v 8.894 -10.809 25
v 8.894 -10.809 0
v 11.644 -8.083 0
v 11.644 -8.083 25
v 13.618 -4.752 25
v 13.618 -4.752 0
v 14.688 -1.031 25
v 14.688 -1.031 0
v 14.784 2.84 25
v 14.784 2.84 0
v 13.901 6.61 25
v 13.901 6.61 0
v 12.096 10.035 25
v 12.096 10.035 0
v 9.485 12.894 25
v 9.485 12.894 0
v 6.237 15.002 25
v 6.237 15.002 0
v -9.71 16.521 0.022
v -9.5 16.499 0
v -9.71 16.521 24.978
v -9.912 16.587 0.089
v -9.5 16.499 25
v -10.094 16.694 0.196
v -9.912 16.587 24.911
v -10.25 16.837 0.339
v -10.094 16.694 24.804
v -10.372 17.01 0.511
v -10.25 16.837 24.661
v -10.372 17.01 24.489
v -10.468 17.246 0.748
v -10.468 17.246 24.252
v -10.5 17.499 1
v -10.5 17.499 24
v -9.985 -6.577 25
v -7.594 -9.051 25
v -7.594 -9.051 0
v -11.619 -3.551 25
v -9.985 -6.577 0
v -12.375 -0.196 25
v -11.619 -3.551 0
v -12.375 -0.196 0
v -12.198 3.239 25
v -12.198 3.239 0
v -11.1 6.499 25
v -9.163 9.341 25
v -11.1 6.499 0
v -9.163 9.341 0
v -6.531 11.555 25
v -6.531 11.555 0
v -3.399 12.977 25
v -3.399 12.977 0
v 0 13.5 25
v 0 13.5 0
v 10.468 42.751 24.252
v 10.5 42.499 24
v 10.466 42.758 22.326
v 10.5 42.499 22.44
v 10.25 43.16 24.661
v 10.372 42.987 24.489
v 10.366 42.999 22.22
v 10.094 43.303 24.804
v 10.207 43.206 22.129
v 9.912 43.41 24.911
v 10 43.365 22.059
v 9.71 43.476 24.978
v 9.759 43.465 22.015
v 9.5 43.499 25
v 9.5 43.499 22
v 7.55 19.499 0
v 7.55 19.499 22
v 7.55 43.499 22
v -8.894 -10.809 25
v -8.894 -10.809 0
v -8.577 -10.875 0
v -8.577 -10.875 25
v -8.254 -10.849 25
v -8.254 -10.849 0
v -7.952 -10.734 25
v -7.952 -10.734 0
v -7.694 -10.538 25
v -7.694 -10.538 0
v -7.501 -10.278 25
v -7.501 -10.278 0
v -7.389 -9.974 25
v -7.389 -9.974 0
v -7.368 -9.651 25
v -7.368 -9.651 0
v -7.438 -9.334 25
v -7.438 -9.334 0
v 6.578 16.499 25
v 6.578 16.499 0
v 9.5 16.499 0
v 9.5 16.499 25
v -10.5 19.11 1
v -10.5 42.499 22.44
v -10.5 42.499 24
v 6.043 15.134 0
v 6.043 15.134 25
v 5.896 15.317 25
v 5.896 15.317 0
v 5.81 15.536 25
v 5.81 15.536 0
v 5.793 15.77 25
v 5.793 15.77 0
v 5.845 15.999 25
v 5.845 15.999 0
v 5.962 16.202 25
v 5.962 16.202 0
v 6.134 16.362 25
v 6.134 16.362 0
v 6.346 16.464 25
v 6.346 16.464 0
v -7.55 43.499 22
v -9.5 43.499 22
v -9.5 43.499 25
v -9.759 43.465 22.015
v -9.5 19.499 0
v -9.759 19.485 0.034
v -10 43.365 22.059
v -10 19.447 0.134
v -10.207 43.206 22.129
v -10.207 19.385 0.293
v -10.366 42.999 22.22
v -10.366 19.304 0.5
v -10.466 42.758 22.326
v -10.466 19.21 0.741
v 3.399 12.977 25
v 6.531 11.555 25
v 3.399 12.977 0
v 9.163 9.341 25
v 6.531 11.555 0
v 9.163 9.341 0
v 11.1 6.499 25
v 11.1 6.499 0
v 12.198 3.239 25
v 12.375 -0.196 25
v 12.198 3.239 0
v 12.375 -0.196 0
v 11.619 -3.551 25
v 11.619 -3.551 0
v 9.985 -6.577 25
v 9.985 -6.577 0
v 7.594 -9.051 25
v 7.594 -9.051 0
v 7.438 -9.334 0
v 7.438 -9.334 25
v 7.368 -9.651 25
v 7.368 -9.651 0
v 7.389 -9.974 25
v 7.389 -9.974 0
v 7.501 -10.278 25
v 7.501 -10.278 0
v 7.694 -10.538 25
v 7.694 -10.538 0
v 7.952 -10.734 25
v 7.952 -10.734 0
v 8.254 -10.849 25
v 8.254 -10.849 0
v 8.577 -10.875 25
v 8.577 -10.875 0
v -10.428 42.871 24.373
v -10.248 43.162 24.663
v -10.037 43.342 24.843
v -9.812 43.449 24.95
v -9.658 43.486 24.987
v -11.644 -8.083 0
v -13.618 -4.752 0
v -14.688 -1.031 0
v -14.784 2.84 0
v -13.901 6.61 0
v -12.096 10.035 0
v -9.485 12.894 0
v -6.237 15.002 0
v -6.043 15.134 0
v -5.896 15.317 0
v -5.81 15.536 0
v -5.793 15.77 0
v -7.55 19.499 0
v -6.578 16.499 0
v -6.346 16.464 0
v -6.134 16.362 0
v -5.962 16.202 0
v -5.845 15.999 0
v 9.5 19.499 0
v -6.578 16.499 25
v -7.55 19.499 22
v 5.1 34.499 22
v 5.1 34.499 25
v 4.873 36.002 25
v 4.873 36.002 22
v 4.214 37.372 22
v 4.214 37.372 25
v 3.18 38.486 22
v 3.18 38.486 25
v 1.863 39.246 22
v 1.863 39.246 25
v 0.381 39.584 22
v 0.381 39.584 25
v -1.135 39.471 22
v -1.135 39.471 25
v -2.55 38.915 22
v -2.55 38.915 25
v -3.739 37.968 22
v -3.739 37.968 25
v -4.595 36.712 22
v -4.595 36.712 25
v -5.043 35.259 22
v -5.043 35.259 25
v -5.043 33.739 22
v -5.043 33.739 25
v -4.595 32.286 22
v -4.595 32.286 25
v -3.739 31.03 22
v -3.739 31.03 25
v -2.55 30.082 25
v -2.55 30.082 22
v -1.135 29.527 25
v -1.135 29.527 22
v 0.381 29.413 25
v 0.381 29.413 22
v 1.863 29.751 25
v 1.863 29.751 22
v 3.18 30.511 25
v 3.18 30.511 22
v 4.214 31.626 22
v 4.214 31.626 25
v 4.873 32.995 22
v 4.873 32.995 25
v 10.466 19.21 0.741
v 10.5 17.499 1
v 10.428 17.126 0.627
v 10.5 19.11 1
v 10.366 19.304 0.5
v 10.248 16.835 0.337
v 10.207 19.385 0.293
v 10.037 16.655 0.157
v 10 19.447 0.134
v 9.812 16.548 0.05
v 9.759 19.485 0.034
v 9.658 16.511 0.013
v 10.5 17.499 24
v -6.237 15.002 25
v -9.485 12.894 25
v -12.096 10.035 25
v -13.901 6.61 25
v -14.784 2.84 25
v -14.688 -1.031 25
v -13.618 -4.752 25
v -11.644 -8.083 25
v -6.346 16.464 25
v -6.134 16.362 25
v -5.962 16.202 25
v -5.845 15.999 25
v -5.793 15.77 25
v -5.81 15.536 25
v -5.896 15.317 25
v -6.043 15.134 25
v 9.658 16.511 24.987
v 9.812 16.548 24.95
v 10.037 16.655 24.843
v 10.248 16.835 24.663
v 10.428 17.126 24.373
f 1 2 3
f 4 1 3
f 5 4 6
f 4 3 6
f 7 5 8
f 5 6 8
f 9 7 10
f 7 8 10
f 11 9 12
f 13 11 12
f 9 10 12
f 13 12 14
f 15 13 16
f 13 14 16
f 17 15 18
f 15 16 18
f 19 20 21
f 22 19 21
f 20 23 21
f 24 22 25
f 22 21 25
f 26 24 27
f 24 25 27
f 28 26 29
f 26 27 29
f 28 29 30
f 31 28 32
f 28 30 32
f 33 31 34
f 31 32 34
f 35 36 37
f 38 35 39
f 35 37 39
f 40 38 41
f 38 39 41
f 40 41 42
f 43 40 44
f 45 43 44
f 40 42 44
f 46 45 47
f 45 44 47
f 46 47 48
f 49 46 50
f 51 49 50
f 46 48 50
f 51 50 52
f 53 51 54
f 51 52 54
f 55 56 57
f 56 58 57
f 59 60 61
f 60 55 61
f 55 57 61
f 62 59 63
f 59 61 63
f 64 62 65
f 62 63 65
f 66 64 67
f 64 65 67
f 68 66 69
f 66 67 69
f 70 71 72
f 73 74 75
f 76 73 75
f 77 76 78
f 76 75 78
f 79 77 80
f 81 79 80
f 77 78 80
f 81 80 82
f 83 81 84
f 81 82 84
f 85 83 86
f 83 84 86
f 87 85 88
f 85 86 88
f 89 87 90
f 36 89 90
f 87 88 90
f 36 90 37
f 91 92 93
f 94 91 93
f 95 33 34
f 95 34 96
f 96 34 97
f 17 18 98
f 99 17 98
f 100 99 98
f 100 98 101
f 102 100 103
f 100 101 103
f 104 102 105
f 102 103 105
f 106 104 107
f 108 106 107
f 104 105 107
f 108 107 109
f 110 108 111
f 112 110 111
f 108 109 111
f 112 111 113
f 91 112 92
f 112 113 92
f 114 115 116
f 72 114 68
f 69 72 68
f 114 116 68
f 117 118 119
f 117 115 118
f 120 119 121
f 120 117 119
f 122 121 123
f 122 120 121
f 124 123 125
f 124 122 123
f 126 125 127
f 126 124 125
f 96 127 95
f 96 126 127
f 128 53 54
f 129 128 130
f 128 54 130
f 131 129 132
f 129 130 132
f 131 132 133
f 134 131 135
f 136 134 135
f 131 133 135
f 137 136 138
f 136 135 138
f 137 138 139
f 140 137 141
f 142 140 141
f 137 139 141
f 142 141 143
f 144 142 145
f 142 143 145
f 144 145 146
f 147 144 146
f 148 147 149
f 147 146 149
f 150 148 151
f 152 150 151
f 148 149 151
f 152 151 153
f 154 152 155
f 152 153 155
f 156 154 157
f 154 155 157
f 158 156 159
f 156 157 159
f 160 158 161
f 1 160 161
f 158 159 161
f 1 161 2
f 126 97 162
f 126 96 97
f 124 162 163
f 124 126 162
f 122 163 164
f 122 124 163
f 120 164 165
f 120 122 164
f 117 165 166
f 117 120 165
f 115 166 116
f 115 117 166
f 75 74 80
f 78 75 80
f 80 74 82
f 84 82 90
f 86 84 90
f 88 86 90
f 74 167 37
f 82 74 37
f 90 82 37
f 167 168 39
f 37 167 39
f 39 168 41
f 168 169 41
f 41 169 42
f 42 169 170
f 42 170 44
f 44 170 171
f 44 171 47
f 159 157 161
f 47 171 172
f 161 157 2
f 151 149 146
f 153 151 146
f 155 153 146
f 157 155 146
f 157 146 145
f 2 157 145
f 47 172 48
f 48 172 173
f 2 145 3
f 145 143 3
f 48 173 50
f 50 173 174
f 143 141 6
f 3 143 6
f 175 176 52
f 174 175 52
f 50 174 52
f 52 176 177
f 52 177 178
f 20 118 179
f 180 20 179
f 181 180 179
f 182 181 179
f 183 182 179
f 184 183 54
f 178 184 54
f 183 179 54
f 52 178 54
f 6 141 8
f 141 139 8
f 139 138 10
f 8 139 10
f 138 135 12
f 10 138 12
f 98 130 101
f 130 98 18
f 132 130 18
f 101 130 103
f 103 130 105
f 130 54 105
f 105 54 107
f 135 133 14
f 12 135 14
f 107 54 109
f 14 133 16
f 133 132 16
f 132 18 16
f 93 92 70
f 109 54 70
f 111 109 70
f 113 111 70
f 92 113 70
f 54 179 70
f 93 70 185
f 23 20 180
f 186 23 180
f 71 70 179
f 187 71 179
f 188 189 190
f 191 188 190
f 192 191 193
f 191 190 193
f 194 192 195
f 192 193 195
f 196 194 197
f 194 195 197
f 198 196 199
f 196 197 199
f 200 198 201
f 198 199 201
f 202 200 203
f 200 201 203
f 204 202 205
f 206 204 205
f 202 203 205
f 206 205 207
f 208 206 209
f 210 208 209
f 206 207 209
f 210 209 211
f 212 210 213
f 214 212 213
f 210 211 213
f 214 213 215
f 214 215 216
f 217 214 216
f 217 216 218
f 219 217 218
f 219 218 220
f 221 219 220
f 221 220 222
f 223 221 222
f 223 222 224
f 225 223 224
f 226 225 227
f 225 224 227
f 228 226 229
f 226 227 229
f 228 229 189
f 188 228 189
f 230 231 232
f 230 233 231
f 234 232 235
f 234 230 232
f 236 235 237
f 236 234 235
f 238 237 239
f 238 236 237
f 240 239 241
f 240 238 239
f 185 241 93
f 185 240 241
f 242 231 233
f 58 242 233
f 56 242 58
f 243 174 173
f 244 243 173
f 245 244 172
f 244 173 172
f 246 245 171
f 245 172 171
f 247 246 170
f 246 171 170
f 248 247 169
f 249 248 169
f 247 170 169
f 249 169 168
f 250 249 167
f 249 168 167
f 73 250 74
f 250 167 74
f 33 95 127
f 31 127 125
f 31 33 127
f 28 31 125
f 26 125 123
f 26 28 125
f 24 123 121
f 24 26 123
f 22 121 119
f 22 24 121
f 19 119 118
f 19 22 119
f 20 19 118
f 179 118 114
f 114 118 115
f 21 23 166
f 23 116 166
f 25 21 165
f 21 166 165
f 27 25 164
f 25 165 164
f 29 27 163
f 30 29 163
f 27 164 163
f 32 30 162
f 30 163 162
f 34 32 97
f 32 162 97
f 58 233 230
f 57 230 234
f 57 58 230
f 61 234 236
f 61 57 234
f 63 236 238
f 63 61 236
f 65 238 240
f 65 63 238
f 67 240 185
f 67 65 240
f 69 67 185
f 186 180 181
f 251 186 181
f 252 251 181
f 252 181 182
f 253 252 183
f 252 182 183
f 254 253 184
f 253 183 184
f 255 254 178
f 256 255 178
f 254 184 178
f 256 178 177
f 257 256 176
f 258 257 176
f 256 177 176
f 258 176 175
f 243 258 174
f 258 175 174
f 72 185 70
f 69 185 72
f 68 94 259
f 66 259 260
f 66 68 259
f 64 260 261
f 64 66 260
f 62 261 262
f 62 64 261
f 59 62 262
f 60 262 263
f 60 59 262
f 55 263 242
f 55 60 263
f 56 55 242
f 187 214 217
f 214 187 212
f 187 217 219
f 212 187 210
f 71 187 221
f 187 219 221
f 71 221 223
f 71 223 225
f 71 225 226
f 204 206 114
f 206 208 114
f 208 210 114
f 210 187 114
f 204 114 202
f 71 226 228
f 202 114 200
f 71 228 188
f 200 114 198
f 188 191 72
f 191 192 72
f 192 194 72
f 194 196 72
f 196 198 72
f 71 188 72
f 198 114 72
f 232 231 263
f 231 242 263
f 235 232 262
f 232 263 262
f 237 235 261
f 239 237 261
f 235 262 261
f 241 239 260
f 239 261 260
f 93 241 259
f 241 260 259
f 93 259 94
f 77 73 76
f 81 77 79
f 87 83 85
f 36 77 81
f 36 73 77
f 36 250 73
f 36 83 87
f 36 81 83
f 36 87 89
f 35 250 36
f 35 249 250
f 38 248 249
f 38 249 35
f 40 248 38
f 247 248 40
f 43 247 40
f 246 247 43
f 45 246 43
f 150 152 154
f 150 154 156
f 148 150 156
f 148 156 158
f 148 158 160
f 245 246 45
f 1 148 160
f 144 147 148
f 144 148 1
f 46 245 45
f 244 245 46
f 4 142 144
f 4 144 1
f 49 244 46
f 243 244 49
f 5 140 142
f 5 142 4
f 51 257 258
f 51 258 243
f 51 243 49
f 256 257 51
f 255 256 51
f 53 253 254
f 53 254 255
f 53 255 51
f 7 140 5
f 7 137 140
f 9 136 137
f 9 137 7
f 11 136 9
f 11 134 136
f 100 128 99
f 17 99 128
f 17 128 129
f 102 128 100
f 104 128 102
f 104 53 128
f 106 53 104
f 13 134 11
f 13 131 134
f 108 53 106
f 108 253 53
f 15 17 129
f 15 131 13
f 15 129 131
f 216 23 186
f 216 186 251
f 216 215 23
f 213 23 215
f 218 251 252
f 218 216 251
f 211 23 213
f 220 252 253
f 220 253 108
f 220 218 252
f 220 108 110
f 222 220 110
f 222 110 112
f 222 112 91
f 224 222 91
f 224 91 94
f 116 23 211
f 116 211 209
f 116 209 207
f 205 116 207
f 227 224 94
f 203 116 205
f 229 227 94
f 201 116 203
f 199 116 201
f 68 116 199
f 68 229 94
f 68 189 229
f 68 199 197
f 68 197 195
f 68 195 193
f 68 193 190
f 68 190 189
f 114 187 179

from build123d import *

# Parameters (mm, degrees)
F1_DEPTH = 25
F2_W     = 21
F2_H     = 24
F2_R     = 5.1
F3_DEPTH = 3
F6_DEPTH = 2.95
F8_R     = 1


with BuildPart() as f1:
    # F0 (on Top) → F1 (new body)
    with BuildSketch(Plane.XY):
        with BuildLine():
            ThreePointArc((7.5943561158, -9.0506011845), (7.5880140669, -10.4148995325), (8.8942921325, -10.8085844568))
            ThreePointArc((8.8942921325, -10.8085844568), (14.7842599605, 2.839809495), (6.2367777531, 15.0016731019))
            ThreePointArc((6.2367777531, 15.0016731019), (5.8102691618, 15.8862752393), (6.5779752006, 16.4986949957))
            Line((6.5779752006, 16.4986949957), (10.5, 16.4986949957))
            Line((10.5, 16.4986949957), (10.5, 19.4986949957))
            Line((10.5, 19.4986949957), (-10.5, 19.4986949957))
            Line((-10.5, 19.4986949957), (-10.5, 16.4986949957))
            Line((-10.5, 16.4986949957), (-6.5779752006, 16.4986949957))
            ThreePointArc((-6.5779752006, 16.4986949957), (-5.8102691618, 15.8862752393), (-6.2367777531, 15.0016731019))
            ThreePointArc((-6.2367777531, 15.0016731019), (-14.7842599605, 2.839809495), (-8.8942921325, -10.8085844568))
            ThreePointArc((-8.8942921325, -10.8085844568), (-7.5880140669, -10.4148995325), (-7.5943561158, -9.0506011845))
            ThreePointArc((-7.5943561158, -9.0506011845), (-11.760600173, 4.9065375968), (0, 13.5))
            ThreePointArc((0, 13.5), (11.760600173, 4.9065375968), (7.5943561158, -9.0506011845))
        make_face()
    extrude(amount=F1_DEPTH)

    # F2 (on face) → F3 (join)
    with BuildSketch(Plane.XY.offset(25)):
        with Locations((0, 31.4986949957)):
            Rectangle(F2_W, F2_H)
        with Locations((0, 34.4986949957)):
            Circle(F2_R, mode=Mode.SUBTRACT)
    extrude(amount=-F3_DEPTH)

    # F4: union 

    # F5 (on face) → F6 (join)
    with BuildSketch(Plane.YZ.offset(10.5)):
        Polygon((19.4986949957, 22), (19.4986949957, 0), (43.4986949957, 22), align=None)
    extrude(amount=-F6_DEPTH)

    # F7: F1 across plane


with BuildPart() as f1_1:
    add(f1.part)
    add(f1.part.mirror(Plane.YZ))

    # F8
    f8_edges = [f1_1.edges().sort_by_distance(p)[0] for p in [
        (10.5, 17.998695, 0),
        (10.5, 16.498695, 12.5),
        (10.5, 29.998695, 25),
        (10.5, 43.498695, 23.5),
        (10.5, 31.498695, 11),
        (-10.5, 43.498695, 23.5),
        (-10.5, 29.998695, 25),
        (-10.5, 16.498695, 12.5),
        (-10.5, 17.998695, 0),
        (-10.5, 31.498695, 11),
    ]]
    fillet(f8_edges, radius=F8_R)


solid = f1_1.part
